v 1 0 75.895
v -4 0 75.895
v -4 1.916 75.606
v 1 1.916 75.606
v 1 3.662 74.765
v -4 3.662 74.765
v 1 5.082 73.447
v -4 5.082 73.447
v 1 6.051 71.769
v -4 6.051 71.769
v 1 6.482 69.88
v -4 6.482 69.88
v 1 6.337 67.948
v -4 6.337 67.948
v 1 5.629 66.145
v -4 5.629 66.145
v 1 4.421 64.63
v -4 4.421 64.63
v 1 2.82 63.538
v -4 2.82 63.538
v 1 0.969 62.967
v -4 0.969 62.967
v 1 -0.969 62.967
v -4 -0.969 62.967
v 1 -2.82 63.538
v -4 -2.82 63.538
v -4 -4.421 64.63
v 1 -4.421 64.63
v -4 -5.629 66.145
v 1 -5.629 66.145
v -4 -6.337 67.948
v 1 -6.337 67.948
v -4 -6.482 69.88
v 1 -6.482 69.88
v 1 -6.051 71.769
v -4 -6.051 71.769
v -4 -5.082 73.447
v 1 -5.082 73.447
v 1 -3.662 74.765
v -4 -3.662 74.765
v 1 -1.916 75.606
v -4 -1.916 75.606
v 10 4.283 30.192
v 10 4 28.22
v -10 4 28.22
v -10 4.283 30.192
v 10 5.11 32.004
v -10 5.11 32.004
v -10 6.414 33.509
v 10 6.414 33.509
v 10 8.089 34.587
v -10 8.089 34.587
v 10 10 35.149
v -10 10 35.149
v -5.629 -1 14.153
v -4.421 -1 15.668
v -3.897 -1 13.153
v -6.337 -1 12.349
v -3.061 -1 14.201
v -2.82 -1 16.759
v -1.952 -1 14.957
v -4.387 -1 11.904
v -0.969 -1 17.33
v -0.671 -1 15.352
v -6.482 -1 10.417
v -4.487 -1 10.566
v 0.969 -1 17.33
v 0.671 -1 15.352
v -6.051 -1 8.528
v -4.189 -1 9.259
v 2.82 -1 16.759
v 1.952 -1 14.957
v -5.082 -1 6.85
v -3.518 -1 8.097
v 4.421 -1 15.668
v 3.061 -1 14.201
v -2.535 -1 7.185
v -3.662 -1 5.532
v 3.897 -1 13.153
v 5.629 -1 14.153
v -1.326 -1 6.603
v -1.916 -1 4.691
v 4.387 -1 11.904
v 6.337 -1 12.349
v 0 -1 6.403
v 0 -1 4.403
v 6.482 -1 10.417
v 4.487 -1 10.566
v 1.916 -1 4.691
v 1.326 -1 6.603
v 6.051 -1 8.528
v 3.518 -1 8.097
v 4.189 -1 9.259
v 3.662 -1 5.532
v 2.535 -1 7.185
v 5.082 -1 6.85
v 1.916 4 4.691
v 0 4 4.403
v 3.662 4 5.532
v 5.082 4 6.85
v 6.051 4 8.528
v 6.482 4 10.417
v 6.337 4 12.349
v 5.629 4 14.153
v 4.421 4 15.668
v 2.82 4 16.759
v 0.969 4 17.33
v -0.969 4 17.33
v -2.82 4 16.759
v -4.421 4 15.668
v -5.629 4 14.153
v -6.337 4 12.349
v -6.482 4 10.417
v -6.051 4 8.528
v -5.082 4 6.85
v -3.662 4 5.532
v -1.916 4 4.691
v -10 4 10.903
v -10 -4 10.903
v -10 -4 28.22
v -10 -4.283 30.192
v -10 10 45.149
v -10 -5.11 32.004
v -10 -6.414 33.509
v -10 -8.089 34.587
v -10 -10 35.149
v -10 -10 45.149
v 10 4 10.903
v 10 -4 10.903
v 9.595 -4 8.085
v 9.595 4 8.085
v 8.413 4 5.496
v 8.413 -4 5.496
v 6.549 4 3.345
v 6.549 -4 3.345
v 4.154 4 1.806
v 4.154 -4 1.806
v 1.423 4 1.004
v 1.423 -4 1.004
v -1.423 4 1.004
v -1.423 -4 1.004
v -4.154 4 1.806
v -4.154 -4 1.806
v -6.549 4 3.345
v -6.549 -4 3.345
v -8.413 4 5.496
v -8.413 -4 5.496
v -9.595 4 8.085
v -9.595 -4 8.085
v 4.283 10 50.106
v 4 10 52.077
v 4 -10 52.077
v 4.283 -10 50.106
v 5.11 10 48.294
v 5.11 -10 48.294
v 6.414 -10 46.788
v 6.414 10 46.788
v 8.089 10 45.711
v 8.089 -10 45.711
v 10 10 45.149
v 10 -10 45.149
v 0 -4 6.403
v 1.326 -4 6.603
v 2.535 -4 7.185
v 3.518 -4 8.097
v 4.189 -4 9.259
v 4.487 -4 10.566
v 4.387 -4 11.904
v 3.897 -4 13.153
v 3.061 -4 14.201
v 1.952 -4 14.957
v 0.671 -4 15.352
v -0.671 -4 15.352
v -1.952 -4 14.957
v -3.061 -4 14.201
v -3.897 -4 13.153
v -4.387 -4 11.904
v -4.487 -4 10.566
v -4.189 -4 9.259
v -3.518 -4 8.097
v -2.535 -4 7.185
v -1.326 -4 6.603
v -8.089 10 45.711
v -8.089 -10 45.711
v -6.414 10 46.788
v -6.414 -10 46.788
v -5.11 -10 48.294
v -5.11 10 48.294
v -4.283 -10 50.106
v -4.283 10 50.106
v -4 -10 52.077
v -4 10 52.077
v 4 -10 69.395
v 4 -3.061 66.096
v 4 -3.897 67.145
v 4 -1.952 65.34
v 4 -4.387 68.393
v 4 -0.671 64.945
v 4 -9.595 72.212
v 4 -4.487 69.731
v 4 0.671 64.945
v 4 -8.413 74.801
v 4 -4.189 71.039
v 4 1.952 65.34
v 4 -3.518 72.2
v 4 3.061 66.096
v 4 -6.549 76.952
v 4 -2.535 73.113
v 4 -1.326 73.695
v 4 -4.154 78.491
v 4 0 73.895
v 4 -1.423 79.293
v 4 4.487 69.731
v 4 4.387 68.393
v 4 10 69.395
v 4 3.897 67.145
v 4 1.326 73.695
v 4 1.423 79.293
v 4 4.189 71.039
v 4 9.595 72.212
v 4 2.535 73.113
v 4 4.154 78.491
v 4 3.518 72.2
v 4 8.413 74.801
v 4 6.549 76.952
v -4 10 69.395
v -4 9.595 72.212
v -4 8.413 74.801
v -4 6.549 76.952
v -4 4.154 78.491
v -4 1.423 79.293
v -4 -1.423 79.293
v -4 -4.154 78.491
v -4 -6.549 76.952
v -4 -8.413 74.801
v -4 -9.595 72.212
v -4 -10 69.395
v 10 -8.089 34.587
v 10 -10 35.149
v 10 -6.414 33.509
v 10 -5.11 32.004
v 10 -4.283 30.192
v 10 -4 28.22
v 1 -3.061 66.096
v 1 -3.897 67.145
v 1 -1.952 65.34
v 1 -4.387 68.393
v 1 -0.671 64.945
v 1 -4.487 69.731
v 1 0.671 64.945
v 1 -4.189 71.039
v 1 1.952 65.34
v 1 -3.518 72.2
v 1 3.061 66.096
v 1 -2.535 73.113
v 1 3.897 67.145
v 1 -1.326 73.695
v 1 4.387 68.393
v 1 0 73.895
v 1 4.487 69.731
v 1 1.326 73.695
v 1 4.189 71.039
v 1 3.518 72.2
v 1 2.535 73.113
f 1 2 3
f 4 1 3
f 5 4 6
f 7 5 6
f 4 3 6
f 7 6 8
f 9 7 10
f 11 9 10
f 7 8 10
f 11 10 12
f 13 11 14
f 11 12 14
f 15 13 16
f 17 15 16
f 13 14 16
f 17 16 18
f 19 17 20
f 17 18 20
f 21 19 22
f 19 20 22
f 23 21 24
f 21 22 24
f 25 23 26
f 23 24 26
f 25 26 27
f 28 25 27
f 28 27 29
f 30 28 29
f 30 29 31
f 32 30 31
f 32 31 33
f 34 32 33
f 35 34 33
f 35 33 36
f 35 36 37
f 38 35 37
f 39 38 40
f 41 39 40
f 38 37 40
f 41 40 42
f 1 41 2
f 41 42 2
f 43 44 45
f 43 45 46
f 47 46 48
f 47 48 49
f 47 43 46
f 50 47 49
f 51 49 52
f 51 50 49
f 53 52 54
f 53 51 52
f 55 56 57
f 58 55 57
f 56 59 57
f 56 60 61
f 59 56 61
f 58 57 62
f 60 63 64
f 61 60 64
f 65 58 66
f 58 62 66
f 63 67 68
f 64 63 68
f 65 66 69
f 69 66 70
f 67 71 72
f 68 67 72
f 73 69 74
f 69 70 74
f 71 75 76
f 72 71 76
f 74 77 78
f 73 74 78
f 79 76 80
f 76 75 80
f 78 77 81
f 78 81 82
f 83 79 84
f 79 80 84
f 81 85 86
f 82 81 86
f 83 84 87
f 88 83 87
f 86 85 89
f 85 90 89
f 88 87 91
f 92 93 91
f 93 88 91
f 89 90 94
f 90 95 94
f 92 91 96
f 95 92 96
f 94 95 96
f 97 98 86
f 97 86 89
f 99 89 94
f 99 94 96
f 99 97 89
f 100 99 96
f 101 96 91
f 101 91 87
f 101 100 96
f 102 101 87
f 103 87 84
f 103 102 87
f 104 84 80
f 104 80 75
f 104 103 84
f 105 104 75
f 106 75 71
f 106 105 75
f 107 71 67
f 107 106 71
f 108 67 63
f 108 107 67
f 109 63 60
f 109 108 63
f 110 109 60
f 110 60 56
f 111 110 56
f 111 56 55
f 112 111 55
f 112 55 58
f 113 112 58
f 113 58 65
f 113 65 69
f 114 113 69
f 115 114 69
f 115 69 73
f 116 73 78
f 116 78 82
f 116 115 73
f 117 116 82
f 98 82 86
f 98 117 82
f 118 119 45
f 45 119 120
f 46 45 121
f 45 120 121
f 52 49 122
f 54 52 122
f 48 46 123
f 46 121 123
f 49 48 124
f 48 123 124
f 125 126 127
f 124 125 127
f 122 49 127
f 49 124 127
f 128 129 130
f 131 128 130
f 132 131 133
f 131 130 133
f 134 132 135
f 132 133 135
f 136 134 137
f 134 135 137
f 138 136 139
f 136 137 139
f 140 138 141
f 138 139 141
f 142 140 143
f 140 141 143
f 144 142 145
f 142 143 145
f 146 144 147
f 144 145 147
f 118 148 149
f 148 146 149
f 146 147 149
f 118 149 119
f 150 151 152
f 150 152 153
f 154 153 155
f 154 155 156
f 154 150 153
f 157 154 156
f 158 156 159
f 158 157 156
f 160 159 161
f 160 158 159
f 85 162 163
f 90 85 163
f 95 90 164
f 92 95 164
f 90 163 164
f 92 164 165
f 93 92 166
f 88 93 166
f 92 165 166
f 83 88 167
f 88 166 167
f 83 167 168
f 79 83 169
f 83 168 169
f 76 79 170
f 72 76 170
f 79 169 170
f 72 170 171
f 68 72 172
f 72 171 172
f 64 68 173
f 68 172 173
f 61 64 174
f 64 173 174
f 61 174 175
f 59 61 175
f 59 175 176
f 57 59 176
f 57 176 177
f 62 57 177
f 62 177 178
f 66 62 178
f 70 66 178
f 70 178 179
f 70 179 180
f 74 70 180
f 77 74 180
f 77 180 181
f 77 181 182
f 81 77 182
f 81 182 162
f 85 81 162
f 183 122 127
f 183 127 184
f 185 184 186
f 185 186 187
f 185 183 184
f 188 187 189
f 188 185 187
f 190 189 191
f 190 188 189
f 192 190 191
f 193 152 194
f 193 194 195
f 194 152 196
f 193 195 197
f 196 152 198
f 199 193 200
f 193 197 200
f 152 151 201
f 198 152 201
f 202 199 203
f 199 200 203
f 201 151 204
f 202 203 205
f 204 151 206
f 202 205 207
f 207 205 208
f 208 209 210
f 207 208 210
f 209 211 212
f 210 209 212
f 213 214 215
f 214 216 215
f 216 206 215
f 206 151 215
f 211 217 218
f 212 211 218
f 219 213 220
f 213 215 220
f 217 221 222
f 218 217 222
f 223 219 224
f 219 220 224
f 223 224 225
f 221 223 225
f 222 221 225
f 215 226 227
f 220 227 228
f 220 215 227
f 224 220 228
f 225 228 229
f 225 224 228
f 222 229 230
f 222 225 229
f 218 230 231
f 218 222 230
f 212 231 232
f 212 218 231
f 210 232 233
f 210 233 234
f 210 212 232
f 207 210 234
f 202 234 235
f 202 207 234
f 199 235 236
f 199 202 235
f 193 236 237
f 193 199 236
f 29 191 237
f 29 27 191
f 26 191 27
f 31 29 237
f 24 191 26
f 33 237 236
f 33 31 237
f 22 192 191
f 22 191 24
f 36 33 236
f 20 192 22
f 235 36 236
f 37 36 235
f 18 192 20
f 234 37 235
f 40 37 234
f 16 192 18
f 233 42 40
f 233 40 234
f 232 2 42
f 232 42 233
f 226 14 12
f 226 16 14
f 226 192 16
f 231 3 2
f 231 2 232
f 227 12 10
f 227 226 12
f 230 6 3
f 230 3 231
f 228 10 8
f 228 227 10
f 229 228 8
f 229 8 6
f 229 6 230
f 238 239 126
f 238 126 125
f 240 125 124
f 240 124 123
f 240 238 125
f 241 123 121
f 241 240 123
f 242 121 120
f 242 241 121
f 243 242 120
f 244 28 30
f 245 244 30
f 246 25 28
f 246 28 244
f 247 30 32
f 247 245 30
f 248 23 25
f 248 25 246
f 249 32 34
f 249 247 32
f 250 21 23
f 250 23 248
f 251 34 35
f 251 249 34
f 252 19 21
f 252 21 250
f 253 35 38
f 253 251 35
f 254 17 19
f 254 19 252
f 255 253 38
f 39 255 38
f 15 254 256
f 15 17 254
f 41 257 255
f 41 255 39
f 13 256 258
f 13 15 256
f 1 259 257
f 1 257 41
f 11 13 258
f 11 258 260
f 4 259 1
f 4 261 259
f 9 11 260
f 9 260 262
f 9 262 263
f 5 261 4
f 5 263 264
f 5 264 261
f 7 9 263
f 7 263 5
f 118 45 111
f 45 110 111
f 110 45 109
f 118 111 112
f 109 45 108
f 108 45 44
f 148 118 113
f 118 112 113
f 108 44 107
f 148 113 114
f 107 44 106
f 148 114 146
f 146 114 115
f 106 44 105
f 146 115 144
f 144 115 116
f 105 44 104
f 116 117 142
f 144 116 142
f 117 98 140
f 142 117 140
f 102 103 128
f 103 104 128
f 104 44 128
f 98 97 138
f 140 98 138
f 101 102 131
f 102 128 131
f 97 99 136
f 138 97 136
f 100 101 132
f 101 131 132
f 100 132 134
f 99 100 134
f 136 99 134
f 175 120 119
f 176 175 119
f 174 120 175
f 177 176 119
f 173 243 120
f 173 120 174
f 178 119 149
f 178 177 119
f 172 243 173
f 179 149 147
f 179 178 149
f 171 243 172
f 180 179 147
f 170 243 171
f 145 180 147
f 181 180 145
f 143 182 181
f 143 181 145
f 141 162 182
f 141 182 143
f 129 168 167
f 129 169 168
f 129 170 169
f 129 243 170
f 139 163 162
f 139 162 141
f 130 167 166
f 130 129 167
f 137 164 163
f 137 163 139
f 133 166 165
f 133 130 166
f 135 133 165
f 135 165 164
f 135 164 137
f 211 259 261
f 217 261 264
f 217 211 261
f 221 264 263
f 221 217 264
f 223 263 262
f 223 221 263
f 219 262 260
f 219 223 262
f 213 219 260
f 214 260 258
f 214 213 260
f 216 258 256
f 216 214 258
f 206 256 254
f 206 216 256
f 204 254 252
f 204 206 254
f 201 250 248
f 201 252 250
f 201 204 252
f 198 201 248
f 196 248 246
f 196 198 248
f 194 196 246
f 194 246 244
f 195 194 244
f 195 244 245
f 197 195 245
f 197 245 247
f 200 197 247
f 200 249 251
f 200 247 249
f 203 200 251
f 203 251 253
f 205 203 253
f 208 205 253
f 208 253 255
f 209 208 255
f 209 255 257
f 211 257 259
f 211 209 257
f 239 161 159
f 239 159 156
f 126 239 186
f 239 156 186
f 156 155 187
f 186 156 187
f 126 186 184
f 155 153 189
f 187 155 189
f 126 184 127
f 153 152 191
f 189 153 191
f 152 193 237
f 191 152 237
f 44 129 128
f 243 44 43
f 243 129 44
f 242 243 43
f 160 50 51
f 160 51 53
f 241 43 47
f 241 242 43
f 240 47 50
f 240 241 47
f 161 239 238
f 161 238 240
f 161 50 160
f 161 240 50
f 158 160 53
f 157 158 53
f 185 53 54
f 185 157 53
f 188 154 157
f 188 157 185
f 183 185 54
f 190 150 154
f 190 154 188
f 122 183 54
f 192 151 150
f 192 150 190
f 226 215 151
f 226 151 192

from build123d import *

# Parameters (mm, degrees)
SKETCH_1_W          = 20
SKETCH_1_H          = 20
EXTRUDE_1_DEPTH     = 80.297387422
SKETCH_7_W          = 35.148693711
SKETCH_7_H          = 6
CUT_EXTRUDE_6_DEPTH = 34
SKETCH_2_R          = 6.5
CUT_EXTRUDE_9_DEPTH = 5
SKETCH_3_R          = 4.5
CUT_EXTRUDE_2_DEPTH = 29
MOVE_BODY_1_ANGLE   = 90
SKETCH_8_W          = 20
SKETCH_8_H          = 20
EXTRUDE_2_DEPTH     = 8
FILLET_2_R          = 7


# Read off the part's stored shape, not the designer's step: 교차3
with BuildPart() as part:
    # 스케치1 → 보스-돌출1 (new body)
    with BuildSketch(Plane.XY):
        Rectangle(SKETCH_1_W, SKETCH_1_H)
    extrude(amount=EXTRUDE_1_DEPTH)

    # 스케치7 → 컷-돌출6 (cut)
    with BuildSketch(Plane(origin=(10, 0, 0), x_dir=(0, 0, -1), z_dir=(1, 0, 0))):
        with Locations((-17.574346855, 7)):
            Rectangle(SKETCH_7_W, SKETCH_7_H)
        with Locations((-17.574346855, -7)):
            Rectangle(SKETCH_7_W, SKETCH_7_H)
    cut_extrude_6 = extrude(amount=-CUT_EXTRUDE_6_DEPTH, mode=Mode.SUBTRACT)

    # 스케치2 → 컷-돌출9 (cut)
    with BuildSketch(Plane(origin=(0, 4, 0), x_dir=(-1, 0, 0), z_dir=(0, -1, 0))):
        with Locations(Location((0, -10.902706153, 0), (0, 0, 90))):
            Circle(SKETCH_2_R)
    cut_extrude_9 = extrude(amount=CUT_EXTRUDE_9_DEPTH, mode=Mode.SUBTRACT)

    # 스케치3 → 컷-돌출2 (cut)
    with BuildSketch(Plane(origin=(0, -4, 0), x_dir=(-1, 0, 0), z_dir=(0, -1, 0))):
        with Locations(Location((0, -10.902706153, 0), (0, 0, 90))):
            Circle(SKETCH_3_R)
        with BuildLine():
            Line((-21.262122506, -10.902706153), (-10, -10.902706153))
            ThreePointArc((-10, -10.902706153), (0, -0.902706153), (10, -10.902706153))
            Line((10, -10.902706153), (21.262122506, -10.902706153))
            ThreePointArc((21.262122506, -10.902706153), (0, 10.359416353), (-21.262122506, -10.902706153))
        make_face()
    cut_extrude_2 = extrude(amount=-CUT_EXTRUDE_2_DEPTH, mode=Mode.SUBTRACT)

    # 대칭 복사6: 컷-돌출6, 컷-돌출9, 컷-돌출2 across plane
    add(cut_extrude_6.mirror(Plane.XY.offset(40.148693711)), mode=Mode.SUBTRACT)
    add(cut_extrude_9.mirror(Plane.XY.offset(40.148693711)), mode=Mode.SUBTRACT)
    add(cut_extrude_2.mirror(Plane.XY.offset(40.148693711)), mode=Mode.SUBTRACT)


with BuildPart() as body_2:
    # 교차3: the piece on the far side of the plane
    add(part.part)
    split(bisect_by=Plane.XY.offset(40.148693711), keep=Keep.BOTTOM)


with BuildPart() as part_1:
    add(part.part)

    # 교차3
    split(bisect_by=Plane.XY.offset(40.148693711), keep=Keep.TOP)


with BuildPart() as part_2:
    # Move Body 1: moved
    add(part_1.part.rotate(Axis((0, 0, 0), (0, 0, 1)), MOVE_BODY_1_ANGLE))


    add(body_2.part)  # 보스-돌출2 merges body 2
    # 스케치8 → 보스-돌출2 (add)
    with BuildSketch(Plane.XY.offset(45.148693711)):
        Rectangle(SKETCH_8_W, SKETCH_8_H)
    extrude(amount=-EXTRUDE_2_DEPTH)

    # 필렛2
    # the kernel refuses this fillet: 7 mm, written as the material it adds along each edge
    with BuildSketch(Plane(origin=(-4, 10, 45.148693711), x_dir=(0, 0, 1), z_dir=(0, -1, 0)), Plane(origin=(10, -4, 35.148693711), x_dir=(0, 0, -1), z_dir=(-1, 0, 0))) as fillet_2_piece_1:
        with BuildLine():
            CenterArc((6.92820323, 7), FILLET_2_R, 188.213210702, 81.786789298)
            Line((0, 6), (-0.138564065, 5.98))
            ThreePointArc((-0.138564065, 5.98), (-0.14, 3), (-0.14, 0))
            Line((-0.14, 0), (0, -0.14))
            Line((0, -0.14), (6.92820323, -0.14))
            Line((6.92820323, -0.14), (6.92820323, 0))
        make_face()
    extrude(amount=20)
    with BuildSketch(Plane(origin=(4, 10, 45.148693711), x_dir=(1, 0, 0), z_dir=(0, -1, 0))) as fillet_2_piece_2:
        with BuildLine():
            CenterArc((7, 6.92820323), FILLET_2_R, 180, 81.786789298)
            Line((0, 6.92820323), (-0.14, 6.92820323))
            Line((-0.14, 6.92820323), (-0.14, 0))
            Line((-0.14, 0), (0, -0.14))
            ThreePointArc((0, -0.14), (3, -0.14), (5.98, -0.138564065))
            Line((5.98, -0.138564065), (6, 0))
        make_face()
    extrude(amount=20)
    with BuildSketch(Plane(origin=(10, 4, 35.148693711), x_dir=(0, 0, -1), z_dir=(-1, 0, 0))) as fillet_2_piece_3:
        with BuildLine():
            CenterArc((6.92820323, -7), FILLET_2_R, 90, 81.786789298)
            Line((0, -6), (-0.138564065, -5.98))
            ThreePointArc((-0.138564065, -5.98), (-0.14, -3), (-0.14, 0))
            Line((-0.14, 0), (0, 0.14))
            Line((0, 0.14), (6.92820323, 0.14))
            Line((6.92820323, 0.14), (6.92820323, 0))
        make_face()
    extrude(amount=20)


solid = part_2.part
